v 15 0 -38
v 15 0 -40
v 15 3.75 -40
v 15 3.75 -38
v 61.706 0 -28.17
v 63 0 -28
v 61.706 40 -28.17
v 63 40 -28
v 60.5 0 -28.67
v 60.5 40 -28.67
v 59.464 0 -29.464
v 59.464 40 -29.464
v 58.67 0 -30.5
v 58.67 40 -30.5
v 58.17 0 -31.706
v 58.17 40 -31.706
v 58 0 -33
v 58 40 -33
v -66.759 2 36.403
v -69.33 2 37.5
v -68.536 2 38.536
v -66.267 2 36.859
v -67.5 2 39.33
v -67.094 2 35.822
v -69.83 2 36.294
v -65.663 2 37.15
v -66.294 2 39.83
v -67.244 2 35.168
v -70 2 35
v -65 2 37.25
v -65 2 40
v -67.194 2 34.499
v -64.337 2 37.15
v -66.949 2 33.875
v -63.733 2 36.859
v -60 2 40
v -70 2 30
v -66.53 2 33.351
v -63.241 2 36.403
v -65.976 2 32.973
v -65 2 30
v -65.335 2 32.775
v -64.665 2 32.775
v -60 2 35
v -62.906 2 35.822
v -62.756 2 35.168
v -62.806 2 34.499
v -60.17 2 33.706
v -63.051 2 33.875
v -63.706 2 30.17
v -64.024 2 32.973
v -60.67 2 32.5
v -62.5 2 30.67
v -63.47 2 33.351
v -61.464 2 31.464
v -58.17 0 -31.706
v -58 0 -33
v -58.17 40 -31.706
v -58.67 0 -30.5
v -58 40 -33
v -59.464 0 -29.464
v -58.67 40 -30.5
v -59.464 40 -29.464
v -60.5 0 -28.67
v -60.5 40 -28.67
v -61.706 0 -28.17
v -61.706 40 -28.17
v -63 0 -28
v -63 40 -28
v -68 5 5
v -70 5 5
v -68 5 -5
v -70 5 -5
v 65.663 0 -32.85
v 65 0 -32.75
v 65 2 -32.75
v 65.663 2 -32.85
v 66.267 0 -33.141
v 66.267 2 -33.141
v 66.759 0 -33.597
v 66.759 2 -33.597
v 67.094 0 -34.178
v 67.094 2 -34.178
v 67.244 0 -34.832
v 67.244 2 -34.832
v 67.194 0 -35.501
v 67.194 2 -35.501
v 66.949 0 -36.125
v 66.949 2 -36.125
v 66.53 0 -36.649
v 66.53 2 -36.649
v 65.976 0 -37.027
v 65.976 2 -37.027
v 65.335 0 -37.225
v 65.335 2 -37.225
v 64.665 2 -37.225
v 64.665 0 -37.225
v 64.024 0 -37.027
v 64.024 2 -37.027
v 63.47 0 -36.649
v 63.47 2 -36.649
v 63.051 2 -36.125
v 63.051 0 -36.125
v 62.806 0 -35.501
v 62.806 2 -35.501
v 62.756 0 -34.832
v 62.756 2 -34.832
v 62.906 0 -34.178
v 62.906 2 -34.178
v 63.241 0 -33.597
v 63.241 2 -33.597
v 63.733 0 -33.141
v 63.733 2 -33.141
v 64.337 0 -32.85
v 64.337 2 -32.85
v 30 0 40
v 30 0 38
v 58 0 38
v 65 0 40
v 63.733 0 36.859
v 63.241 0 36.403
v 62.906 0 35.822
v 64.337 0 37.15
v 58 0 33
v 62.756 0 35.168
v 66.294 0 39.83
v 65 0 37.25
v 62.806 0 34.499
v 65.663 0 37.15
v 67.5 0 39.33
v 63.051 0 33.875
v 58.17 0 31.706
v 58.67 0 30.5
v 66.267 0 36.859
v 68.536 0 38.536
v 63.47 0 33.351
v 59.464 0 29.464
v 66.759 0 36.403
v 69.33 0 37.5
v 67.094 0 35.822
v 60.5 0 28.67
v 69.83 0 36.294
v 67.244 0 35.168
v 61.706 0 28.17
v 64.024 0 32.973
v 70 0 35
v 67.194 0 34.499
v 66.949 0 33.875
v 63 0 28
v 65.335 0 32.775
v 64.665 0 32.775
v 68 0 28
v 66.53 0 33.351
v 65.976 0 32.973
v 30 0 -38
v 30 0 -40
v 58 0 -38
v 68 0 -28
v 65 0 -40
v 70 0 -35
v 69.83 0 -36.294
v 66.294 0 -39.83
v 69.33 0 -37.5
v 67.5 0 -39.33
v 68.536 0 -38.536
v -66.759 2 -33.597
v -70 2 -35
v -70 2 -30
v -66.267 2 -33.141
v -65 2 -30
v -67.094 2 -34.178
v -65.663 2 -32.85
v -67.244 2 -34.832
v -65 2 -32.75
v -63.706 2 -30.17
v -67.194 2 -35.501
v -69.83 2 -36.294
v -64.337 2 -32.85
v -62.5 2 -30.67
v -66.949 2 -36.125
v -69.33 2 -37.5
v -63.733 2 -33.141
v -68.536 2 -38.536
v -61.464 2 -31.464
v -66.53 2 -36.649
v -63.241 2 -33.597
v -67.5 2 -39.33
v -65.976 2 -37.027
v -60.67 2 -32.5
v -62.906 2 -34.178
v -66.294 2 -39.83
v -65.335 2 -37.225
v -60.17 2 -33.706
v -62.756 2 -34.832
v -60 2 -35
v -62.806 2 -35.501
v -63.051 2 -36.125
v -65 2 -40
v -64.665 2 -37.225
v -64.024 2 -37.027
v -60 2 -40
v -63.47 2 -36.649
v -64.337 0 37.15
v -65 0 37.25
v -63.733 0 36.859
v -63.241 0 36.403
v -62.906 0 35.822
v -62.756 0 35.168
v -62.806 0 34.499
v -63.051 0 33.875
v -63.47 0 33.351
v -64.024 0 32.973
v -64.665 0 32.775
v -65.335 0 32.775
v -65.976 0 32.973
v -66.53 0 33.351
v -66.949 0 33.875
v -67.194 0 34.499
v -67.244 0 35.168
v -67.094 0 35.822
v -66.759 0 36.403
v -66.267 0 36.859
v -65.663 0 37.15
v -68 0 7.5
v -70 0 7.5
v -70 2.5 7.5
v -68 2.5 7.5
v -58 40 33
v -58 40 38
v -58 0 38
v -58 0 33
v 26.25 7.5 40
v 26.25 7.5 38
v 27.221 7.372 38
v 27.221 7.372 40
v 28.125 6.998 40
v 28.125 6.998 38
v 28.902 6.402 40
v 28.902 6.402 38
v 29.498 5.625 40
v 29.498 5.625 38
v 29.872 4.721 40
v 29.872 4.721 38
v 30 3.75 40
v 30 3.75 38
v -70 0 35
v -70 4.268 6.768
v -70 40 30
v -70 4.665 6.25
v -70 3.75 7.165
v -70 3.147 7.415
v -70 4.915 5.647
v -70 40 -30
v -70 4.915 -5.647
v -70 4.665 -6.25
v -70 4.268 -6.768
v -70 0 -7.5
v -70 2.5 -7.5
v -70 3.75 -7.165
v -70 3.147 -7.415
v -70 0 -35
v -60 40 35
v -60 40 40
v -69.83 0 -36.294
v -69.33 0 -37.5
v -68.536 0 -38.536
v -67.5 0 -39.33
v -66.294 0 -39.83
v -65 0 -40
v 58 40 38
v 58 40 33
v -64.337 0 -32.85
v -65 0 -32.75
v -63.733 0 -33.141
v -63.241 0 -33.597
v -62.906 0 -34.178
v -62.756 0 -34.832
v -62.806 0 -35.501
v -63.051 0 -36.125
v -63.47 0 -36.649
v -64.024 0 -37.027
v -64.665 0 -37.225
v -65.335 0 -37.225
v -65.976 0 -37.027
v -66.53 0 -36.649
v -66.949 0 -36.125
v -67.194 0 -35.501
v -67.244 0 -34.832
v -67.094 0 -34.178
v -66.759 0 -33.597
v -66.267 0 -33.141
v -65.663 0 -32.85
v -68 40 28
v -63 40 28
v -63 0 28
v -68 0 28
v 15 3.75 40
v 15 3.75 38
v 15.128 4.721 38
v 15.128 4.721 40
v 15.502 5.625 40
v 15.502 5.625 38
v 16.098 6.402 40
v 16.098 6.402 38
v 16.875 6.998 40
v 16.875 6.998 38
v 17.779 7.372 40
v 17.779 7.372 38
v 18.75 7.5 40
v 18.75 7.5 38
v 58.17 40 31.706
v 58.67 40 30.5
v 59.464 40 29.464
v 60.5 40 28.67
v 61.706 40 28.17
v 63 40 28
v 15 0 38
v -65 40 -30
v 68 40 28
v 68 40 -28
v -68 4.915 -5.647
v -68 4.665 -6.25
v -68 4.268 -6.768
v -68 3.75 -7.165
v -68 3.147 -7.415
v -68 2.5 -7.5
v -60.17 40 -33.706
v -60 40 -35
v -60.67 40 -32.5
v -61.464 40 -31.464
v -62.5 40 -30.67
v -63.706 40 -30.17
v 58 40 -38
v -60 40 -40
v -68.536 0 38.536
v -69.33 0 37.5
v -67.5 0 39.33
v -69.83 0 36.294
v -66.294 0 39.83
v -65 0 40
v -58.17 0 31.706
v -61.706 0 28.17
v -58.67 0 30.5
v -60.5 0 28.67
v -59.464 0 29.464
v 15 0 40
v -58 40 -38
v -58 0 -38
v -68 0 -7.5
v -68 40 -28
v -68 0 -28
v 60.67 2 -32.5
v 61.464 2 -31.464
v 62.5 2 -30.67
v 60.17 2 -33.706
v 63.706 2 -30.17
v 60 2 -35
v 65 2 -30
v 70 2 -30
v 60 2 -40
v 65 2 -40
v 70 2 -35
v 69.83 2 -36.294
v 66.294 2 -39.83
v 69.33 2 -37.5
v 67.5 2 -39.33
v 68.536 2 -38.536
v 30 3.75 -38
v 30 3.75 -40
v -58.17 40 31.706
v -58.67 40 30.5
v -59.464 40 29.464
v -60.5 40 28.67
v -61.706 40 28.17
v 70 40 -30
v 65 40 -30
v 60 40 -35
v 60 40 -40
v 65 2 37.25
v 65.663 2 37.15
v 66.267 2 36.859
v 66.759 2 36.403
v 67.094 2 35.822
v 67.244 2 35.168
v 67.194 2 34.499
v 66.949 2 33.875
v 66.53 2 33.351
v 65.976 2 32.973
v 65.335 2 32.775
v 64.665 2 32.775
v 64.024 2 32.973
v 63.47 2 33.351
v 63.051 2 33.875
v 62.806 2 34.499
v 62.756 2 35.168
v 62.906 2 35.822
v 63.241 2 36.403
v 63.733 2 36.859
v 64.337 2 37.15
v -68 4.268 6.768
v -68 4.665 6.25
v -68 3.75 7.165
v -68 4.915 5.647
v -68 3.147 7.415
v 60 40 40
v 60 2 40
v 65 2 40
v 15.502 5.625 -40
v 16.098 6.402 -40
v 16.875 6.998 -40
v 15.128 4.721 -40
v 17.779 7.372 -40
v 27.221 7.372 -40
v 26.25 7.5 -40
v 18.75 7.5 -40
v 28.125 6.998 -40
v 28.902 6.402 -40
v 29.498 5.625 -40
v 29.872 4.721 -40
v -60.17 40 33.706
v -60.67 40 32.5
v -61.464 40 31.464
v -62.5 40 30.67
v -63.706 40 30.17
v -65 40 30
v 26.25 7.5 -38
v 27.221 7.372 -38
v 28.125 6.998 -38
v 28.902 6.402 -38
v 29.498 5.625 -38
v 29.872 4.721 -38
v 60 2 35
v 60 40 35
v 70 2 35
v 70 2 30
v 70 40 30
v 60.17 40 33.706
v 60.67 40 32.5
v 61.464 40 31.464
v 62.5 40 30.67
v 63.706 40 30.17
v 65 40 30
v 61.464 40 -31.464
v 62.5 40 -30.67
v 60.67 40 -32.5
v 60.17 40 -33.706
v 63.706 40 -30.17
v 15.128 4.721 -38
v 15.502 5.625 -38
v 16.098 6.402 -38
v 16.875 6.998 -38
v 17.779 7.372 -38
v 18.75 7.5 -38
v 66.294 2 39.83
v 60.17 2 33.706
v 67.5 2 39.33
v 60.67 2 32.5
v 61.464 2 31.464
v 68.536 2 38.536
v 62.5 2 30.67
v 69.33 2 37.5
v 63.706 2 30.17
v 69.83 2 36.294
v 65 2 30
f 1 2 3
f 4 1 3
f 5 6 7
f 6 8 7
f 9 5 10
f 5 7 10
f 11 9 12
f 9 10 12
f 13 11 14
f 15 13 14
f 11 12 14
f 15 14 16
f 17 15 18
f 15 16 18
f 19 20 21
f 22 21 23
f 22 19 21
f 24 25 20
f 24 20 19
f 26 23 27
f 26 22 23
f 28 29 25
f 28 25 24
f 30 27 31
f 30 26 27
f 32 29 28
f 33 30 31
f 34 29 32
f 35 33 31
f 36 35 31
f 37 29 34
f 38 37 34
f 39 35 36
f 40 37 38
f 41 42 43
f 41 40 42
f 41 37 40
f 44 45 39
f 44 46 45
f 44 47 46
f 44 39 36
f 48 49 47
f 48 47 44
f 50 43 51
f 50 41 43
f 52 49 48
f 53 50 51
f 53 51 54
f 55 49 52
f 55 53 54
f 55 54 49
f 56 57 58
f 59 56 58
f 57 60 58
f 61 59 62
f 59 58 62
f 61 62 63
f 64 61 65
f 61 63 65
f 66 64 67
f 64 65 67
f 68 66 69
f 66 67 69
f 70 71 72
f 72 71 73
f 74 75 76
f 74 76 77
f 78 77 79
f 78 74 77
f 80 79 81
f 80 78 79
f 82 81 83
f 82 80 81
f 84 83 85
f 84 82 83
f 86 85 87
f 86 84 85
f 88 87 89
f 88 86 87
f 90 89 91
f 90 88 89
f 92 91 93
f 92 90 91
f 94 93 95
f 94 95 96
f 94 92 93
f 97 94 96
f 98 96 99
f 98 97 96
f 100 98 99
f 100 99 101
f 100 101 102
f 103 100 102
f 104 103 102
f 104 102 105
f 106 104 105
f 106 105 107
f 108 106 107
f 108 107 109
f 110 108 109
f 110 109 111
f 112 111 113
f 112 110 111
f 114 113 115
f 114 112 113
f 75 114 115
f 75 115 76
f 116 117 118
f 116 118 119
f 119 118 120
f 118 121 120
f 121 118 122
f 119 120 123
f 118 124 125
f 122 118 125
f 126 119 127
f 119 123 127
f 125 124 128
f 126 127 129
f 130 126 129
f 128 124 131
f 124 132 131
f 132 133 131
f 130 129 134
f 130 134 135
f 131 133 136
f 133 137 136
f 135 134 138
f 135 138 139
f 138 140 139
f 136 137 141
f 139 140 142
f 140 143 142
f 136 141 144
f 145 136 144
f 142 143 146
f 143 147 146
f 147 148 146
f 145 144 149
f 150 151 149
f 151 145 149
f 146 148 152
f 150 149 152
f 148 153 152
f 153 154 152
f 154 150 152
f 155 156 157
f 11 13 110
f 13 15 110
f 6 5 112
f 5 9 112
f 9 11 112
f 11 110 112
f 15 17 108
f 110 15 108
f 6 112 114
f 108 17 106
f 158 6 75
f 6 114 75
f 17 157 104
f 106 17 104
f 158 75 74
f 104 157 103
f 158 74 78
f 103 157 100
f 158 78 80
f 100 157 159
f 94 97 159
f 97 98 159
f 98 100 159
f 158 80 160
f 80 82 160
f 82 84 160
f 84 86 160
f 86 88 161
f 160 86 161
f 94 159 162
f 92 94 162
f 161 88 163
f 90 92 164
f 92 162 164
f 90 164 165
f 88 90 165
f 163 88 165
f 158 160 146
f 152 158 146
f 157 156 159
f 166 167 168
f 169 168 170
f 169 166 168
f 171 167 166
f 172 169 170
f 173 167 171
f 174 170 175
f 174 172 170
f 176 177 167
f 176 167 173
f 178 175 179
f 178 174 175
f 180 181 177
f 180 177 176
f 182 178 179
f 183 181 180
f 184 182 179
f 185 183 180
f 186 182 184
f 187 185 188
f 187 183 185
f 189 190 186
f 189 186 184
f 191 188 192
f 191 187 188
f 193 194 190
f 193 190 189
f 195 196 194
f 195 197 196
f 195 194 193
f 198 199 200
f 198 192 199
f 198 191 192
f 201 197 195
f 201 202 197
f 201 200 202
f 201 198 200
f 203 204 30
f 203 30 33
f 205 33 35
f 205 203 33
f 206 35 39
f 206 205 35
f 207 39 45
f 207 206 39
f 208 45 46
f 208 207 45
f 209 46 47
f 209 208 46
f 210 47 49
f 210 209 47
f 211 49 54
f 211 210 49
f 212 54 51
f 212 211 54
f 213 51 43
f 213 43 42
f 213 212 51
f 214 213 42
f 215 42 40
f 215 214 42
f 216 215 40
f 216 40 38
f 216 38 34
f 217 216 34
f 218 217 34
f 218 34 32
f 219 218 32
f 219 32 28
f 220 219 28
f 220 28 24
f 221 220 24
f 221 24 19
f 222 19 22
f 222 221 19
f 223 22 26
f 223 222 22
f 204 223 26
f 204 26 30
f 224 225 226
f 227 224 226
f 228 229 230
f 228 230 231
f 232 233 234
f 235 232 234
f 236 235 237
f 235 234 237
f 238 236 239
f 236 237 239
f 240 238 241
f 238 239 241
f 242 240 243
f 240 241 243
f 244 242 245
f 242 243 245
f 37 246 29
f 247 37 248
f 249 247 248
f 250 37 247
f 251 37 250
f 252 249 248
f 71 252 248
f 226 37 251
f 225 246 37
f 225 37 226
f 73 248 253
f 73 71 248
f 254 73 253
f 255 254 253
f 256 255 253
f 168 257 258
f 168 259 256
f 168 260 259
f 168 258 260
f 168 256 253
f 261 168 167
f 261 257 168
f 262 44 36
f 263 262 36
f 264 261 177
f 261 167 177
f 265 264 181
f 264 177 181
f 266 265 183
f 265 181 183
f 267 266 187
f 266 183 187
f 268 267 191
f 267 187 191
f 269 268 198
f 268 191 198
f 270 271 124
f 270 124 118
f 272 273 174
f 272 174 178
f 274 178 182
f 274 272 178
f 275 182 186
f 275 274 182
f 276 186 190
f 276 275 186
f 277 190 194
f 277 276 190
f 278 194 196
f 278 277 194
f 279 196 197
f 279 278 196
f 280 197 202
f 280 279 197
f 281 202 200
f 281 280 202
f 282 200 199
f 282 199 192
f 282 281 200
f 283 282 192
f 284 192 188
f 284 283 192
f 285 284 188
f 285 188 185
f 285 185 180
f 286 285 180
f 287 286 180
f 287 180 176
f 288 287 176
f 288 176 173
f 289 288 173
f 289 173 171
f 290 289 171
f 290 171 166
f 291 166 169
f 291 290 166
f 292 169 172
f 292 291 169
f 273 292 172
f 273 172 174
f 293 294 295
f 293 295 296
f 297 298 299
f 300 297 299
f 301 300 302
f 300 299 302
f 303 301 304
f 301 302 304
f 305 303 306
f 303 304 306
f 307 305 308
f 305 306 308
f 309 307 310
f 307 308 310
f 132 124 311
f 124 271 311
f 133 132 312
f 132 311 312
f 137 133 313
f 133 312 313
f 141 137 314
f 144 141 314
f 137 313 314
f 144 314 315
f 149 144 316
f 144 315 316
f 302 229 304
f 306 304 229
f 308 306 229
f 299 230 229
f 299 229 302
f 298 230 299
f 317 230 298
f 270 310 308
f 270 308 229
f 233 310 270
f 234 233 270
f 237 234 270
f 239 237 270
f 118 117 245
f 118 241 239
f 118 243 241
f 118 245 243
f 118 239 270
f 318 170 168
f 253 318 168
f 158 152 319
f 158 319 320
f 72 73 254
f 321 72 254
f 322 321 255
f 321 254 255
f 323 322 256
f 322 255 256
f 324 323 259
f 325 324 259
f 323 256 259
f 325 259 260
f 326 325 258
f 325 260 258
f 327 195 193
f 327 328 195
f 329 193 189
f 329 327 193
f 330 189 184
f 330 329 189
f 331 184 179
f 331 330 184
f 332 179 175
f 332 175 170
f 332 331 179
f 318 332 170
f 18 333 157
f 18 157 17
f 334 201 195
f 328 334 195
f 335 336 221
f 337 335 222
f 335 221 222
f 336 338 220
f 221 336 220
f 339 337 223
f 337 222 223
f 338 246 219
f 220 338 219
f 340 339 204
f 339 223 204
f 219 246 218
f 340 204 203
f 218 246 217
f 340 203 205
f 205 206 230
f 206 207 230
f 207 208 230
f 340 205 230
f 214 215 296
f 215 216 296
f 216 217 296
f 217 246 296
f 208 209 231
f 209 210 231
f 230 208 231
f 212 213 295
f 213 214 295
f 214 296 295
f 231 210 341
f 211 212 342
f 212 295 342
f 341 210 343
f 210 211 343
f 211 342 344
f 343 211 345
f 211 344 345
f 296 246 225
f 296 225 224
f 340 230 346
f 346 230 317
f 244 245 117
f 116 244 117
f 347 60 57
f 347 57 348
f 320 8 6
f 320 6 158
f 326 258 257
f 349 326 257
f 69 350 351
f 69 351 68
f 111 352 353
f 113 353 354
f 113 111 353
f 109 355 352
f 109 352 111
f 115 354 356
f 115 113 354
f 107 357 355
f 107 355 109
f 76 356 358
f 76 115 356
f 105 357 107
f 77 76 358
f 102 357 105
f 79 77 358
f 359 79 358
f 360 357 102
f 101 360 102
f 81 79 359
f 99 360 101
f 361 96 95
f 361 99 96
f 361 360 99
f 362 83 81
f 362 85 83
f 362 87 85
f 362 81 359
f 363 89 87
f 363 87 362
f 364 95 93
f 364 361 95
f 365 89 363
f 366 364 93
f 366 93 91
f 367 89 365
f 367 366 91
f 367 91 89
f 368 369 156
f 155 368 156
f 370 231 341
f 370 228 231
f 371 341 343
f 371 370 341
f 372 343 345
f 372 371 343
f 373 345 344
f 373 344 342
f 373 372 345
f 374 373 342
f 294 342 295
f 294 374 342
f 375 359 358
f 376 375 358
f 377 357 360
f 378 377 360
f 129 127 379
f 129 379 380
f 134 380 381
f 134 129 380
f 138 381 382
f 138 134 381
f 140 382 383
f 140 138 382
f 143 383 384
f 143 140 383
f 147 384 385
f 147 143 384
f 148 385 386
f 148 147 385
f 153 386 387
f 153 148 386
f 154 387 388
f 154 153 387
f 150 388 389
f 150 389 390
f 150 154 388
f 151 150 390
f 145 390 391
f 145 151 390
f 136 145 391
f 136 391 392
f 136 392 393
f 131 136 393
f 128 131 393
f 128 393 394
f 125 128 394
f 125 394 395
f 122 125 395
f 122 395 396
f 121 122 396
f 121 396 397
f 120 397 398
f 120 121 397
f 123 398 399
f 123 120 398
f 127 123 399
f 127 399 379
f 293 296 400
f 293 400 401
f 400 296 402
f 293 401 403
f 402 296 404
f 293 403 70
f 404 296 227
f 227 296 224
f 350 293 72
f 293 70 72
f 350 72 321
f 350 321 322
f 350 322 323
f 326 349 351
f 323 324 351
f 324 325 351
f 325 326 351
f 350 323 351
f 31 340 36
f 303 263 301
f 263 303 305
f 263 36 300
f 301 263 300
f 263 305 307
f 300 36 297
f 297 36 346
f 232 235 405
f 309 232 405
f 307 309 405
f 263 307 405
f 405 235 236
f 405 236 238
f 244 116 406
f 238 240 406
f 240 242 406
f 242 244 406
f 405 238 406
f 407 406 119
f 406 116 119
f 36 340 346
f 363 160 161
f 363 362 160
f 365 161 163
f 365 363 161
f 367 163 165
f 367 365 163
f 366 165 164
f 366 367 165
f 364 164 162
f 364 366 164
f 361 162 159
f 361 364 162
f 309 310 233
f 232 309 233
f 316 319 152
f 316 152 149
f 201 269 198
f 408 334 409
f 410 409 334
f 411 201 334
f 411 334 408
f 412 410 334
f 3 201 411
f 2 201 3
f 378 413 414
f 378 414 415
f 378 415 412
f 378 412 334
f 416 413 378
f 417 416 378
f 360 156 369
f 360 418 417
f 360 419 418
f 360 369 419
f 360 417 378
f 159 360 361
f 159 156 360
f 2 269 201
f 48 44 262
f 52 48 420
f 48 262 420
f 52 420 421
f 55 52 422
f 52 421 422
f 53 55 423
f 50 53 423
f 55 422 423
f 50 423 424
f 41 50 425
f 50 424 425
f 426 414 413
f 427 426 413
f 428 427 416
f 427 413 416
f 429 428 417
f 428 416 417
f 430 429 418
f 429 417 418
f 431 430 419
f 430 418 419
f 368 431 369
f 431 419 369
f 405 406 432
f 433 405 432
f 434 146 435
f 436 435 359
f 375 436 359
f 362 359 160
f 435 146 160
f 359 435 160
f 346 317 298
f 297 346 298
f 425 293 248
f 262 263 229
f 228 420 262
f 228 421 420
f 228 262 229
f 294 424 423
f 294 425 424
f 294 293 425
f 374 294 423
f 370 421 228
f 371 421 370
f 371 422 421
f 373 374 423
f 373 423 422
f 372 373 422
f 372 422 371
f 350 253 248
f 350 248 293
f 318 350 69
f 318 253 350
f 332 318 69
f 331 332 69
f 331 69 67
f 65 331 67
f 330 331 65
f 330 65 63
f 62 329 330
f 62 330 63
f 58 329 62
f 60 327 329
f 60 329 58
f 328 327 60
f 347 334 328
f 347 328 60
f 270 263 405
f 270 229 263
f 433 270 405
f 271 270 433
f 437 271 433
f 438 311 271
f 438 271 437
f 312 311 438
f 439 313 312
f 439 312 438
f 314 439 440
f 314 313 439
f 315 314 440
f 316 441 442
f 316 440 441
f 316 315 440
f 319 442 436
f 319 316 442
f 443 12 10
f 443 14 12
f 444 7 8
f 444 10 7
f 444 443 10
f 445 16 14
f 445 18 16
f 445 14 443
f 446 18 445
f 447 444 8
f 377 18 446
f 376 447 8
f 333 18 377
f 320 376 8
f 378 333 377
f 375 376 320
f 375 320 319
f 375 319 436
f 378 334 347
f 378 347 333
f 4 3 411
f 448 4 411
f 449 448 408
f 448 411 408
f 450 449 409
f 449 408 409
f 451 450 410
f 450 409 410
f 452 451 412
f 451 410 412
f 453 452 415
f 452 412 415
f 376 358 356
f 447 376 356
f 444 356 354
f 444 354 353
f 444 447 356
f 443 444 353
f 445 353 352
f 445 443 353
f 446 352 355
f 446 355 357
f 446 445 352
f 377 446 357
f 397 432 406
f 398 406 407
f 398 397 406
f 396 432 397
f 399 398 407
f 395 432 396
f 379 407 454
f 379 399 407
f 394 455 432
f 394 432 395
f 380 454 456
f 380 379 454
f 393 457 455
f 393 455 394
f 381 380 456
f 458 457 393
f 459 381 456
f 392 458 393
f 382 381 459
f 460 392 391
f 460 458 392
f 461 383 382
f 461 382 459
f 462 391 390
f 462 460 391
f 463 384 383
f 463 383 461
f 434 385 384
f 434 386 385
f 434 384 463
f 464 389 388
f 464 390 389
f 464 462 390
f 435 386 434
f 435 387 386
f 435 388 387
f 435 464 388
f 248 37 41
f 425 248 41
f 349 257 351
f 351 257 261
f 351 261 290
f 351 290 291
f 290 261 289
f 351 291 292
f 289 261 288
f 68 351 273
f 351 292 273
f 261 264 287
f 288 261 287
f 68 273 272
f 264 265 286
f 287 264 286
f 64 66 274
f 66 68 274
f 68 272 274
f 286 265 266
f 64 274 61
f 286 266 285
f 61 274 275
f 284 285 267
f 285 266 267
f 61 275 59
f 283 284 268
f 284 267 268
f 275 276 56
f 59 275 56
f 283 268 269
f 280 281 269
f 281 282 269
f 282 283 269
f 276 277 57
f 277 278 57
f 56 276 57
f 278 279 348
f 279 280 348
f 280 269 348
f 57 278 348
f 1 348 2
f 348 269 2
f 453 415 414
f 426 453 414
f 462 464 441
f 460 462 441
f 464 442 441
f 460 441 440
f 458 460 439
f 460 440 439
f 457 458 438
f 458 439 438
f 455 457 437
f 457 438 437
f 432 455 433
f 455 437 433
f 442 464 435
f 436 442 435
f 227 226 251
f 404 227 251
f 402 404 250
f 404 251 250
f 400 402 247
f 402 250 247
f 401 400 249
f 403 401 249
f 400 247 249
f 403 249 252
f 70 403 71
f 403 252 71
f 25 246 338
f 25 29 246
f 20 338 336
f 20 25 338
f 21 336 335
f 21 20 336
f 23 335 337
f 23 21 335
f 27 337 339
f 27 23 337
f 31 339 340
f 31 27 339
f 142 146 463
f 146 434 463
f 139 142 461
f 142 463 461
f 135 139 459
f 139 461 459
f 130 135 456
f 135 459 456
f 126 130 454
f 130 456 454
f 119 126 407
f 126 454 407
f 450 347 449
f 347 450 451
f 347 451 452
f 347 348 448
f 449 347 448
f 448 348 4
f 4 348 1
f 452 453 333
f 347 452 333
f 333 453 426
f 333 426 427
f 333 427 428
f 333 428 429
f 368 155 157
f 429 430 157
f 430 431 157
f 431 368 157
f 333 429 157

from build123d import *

# Parameters (mm, degrees)
BOSS_EXTRUDE6_DEPTH = 40
SKETCH1_7_W         = 10
SKETCH1_7_H         = 10
SKETCH1_7_R         = 2.25
BOSS_EXTRUDE7_DEPTH = 2
FILLET1_R           = 5
CUT_EXTRUDE1_DEPTH  = 114.578166916
CUT_EXTRUDE2_REACH  = 152.997


with BuildPart() as part:
    # Sketch1 → Boss-Extrude6 (new body)
    with BuildSketch(Plane(origin=(0, 0, 0), x_dir=(1, 0, 0), z_dir=(0, 1, 0))):
        Polygon((70, 30), (60, 30), (60, 40), (-60, 40), (-60, 30), (-70, 30), (-70, -30), (-60, -30), (-60, -40), (60, -40), (60, -30), (70, -30), align=None)
        Polygon((58, 28), (68, 28), (68, -28), (58, -28), (58, -38), (-58, -38), (-58, -28), (-68, -28), (-68, 28), (-58, 28), (-58, 38), (58, 38), align=None, mode=Mode.SUBTRACT)
    extrude(amount=BOSS_EXTRUDE6_DEPTH)

    # Sketch1<7> → Boss-Extrude7 (add)
    # profile 1 of 4: a face of its own
    with BuildSketch(Plane(origin=(0, 0, 0), x_dir=(1, 0, 0), z_dir=(0, 1, 0))):
        with Locations((65, 35)):
            Rectangle(SKETCH1_7_W, SKETCH1_7_H)
        with Locations((65, 35)):
            Circle(SKETCH1_7_R, mode=Mode.SUBTRACT)
    # profile 2 of 4: a face of its own
    with BuildSketch(Plane(origin=(0, 0, 0), x_dir=(1, 0, 0), z_dir=(0, 1, 0))):
        with Locations((65, -35)):
            Rectangle(SKETCH1_7_W, SKETCH1_7_H)
        with Locations((65, -35)):
            Circle(SKETCH1_7_R, mode=Mode.SUBTRACT)
    # profile 3 of 4: a face of its own
    with BuildSketch(Plane(origin=(0, 0, 0), x_dir=(1, 0, 0), z_dir=(0, 1, 0))):
        with Locations((-65, 35)):
            Rectangle(SKETCH1_7_W, SKETCH1_7_H)
        with Locations((-65, 35)):
            Circle(SKETCH1_7_R, mode=Mode.SUBTRACT)
    # profile 4 of 4: a face of its own
    with BuildSketch(Plane(origin=(0, 0, 0), x_dir=(1, 0, 0), z_dir=(0, 1, 0))):
        with Locations((-65, -35)):
            Rectangle(SKETCH1_7_W, SKETCH1_7_H)
        with Locations((-65, -35)):
            Circle(SKETCH1_7_R, mode=Mode.SUBTRACT)
    extrude(amount=BOSS_EXTRUDE7_DEPTH)

    # Fillet1
    fillet1_edges = [part.edges().sort_by_distance(p)[0] for p in [
        (-70, 1, 40),
        (-70, 1, -40),
        (70, 1, -40),
        (70, 1, 40),
        (-60, 21, 30),
        (60, 21, 30),
        (58, 20, 28),
        (58, 20, -28),
        (60, 21, -30),
        (-58, 20, 28),
        (-58, 20, -28),
        (-60, 21, -30),
    ]]
    fillet(fillet1_edges, radius=FILLET1_R)

    # Sketch2 → Cut-Extrude1 (cut, through all)
    with BuildSketch(Plane(origin=(0, 0, -40), x_dir=(-1, 0, 0), z_dir=(0, 0, -1))):
        with BuildLine():
            Line((-30, 0), (-15, 0))
            Line((-15, 0), (-15, 3.75))
            ThreePointArc((-15, 3.75), (-16.098349571, 6.401650429), (-18.75, 7.5))
            Line((-18.75, 7.5), (-26.25, 7.5))
            ThreePointArc((-26.25, 7.5), (-28.901650429, 6.401650429), (-30, 3.75))
            Line((-30, 3.75), (-30, 0))
        make_face()
    extrude(amount=-CUT_EXTRUDE1_DEPTH, mode=Mode.SUBTRACT)

    # Sketch3 → Cut-Extrude2 (cut, up to next)
    with BuildSketch(Plane.ZY.offset(70), mode=Mode.PRIVATE) as cut_extrude2_sk1:
        with BuildLine():
            Line((-7.5, 0), (7.5, 0))
            Line((7.5, 0), (7.5, 2.5))
            ThreePointArc((7.5, 2.5), (6.767766953, 4.267766953), (5, 5))
            Line((5, 5), (-5, 5))
            ThreePointArc((-5, 5), (-6.767766953, 4.267766953), (-7.5, 2.5))
            Line((-7.5, 2.5), (-7.5, 0))
        make_face()
    cut_extrude2_tool1 = extrude(cut_extrude2_sk1.sketch, amount=-CUT_EXTRUDE2_REACH, mode=Mode.PRIVATE) & part.part
    add(cut_extrude2_tool1.solids().sort_by_distance((-70, 2.42798, 0))[0], mode=Mode.SUBTRACT)


solid = part.part
